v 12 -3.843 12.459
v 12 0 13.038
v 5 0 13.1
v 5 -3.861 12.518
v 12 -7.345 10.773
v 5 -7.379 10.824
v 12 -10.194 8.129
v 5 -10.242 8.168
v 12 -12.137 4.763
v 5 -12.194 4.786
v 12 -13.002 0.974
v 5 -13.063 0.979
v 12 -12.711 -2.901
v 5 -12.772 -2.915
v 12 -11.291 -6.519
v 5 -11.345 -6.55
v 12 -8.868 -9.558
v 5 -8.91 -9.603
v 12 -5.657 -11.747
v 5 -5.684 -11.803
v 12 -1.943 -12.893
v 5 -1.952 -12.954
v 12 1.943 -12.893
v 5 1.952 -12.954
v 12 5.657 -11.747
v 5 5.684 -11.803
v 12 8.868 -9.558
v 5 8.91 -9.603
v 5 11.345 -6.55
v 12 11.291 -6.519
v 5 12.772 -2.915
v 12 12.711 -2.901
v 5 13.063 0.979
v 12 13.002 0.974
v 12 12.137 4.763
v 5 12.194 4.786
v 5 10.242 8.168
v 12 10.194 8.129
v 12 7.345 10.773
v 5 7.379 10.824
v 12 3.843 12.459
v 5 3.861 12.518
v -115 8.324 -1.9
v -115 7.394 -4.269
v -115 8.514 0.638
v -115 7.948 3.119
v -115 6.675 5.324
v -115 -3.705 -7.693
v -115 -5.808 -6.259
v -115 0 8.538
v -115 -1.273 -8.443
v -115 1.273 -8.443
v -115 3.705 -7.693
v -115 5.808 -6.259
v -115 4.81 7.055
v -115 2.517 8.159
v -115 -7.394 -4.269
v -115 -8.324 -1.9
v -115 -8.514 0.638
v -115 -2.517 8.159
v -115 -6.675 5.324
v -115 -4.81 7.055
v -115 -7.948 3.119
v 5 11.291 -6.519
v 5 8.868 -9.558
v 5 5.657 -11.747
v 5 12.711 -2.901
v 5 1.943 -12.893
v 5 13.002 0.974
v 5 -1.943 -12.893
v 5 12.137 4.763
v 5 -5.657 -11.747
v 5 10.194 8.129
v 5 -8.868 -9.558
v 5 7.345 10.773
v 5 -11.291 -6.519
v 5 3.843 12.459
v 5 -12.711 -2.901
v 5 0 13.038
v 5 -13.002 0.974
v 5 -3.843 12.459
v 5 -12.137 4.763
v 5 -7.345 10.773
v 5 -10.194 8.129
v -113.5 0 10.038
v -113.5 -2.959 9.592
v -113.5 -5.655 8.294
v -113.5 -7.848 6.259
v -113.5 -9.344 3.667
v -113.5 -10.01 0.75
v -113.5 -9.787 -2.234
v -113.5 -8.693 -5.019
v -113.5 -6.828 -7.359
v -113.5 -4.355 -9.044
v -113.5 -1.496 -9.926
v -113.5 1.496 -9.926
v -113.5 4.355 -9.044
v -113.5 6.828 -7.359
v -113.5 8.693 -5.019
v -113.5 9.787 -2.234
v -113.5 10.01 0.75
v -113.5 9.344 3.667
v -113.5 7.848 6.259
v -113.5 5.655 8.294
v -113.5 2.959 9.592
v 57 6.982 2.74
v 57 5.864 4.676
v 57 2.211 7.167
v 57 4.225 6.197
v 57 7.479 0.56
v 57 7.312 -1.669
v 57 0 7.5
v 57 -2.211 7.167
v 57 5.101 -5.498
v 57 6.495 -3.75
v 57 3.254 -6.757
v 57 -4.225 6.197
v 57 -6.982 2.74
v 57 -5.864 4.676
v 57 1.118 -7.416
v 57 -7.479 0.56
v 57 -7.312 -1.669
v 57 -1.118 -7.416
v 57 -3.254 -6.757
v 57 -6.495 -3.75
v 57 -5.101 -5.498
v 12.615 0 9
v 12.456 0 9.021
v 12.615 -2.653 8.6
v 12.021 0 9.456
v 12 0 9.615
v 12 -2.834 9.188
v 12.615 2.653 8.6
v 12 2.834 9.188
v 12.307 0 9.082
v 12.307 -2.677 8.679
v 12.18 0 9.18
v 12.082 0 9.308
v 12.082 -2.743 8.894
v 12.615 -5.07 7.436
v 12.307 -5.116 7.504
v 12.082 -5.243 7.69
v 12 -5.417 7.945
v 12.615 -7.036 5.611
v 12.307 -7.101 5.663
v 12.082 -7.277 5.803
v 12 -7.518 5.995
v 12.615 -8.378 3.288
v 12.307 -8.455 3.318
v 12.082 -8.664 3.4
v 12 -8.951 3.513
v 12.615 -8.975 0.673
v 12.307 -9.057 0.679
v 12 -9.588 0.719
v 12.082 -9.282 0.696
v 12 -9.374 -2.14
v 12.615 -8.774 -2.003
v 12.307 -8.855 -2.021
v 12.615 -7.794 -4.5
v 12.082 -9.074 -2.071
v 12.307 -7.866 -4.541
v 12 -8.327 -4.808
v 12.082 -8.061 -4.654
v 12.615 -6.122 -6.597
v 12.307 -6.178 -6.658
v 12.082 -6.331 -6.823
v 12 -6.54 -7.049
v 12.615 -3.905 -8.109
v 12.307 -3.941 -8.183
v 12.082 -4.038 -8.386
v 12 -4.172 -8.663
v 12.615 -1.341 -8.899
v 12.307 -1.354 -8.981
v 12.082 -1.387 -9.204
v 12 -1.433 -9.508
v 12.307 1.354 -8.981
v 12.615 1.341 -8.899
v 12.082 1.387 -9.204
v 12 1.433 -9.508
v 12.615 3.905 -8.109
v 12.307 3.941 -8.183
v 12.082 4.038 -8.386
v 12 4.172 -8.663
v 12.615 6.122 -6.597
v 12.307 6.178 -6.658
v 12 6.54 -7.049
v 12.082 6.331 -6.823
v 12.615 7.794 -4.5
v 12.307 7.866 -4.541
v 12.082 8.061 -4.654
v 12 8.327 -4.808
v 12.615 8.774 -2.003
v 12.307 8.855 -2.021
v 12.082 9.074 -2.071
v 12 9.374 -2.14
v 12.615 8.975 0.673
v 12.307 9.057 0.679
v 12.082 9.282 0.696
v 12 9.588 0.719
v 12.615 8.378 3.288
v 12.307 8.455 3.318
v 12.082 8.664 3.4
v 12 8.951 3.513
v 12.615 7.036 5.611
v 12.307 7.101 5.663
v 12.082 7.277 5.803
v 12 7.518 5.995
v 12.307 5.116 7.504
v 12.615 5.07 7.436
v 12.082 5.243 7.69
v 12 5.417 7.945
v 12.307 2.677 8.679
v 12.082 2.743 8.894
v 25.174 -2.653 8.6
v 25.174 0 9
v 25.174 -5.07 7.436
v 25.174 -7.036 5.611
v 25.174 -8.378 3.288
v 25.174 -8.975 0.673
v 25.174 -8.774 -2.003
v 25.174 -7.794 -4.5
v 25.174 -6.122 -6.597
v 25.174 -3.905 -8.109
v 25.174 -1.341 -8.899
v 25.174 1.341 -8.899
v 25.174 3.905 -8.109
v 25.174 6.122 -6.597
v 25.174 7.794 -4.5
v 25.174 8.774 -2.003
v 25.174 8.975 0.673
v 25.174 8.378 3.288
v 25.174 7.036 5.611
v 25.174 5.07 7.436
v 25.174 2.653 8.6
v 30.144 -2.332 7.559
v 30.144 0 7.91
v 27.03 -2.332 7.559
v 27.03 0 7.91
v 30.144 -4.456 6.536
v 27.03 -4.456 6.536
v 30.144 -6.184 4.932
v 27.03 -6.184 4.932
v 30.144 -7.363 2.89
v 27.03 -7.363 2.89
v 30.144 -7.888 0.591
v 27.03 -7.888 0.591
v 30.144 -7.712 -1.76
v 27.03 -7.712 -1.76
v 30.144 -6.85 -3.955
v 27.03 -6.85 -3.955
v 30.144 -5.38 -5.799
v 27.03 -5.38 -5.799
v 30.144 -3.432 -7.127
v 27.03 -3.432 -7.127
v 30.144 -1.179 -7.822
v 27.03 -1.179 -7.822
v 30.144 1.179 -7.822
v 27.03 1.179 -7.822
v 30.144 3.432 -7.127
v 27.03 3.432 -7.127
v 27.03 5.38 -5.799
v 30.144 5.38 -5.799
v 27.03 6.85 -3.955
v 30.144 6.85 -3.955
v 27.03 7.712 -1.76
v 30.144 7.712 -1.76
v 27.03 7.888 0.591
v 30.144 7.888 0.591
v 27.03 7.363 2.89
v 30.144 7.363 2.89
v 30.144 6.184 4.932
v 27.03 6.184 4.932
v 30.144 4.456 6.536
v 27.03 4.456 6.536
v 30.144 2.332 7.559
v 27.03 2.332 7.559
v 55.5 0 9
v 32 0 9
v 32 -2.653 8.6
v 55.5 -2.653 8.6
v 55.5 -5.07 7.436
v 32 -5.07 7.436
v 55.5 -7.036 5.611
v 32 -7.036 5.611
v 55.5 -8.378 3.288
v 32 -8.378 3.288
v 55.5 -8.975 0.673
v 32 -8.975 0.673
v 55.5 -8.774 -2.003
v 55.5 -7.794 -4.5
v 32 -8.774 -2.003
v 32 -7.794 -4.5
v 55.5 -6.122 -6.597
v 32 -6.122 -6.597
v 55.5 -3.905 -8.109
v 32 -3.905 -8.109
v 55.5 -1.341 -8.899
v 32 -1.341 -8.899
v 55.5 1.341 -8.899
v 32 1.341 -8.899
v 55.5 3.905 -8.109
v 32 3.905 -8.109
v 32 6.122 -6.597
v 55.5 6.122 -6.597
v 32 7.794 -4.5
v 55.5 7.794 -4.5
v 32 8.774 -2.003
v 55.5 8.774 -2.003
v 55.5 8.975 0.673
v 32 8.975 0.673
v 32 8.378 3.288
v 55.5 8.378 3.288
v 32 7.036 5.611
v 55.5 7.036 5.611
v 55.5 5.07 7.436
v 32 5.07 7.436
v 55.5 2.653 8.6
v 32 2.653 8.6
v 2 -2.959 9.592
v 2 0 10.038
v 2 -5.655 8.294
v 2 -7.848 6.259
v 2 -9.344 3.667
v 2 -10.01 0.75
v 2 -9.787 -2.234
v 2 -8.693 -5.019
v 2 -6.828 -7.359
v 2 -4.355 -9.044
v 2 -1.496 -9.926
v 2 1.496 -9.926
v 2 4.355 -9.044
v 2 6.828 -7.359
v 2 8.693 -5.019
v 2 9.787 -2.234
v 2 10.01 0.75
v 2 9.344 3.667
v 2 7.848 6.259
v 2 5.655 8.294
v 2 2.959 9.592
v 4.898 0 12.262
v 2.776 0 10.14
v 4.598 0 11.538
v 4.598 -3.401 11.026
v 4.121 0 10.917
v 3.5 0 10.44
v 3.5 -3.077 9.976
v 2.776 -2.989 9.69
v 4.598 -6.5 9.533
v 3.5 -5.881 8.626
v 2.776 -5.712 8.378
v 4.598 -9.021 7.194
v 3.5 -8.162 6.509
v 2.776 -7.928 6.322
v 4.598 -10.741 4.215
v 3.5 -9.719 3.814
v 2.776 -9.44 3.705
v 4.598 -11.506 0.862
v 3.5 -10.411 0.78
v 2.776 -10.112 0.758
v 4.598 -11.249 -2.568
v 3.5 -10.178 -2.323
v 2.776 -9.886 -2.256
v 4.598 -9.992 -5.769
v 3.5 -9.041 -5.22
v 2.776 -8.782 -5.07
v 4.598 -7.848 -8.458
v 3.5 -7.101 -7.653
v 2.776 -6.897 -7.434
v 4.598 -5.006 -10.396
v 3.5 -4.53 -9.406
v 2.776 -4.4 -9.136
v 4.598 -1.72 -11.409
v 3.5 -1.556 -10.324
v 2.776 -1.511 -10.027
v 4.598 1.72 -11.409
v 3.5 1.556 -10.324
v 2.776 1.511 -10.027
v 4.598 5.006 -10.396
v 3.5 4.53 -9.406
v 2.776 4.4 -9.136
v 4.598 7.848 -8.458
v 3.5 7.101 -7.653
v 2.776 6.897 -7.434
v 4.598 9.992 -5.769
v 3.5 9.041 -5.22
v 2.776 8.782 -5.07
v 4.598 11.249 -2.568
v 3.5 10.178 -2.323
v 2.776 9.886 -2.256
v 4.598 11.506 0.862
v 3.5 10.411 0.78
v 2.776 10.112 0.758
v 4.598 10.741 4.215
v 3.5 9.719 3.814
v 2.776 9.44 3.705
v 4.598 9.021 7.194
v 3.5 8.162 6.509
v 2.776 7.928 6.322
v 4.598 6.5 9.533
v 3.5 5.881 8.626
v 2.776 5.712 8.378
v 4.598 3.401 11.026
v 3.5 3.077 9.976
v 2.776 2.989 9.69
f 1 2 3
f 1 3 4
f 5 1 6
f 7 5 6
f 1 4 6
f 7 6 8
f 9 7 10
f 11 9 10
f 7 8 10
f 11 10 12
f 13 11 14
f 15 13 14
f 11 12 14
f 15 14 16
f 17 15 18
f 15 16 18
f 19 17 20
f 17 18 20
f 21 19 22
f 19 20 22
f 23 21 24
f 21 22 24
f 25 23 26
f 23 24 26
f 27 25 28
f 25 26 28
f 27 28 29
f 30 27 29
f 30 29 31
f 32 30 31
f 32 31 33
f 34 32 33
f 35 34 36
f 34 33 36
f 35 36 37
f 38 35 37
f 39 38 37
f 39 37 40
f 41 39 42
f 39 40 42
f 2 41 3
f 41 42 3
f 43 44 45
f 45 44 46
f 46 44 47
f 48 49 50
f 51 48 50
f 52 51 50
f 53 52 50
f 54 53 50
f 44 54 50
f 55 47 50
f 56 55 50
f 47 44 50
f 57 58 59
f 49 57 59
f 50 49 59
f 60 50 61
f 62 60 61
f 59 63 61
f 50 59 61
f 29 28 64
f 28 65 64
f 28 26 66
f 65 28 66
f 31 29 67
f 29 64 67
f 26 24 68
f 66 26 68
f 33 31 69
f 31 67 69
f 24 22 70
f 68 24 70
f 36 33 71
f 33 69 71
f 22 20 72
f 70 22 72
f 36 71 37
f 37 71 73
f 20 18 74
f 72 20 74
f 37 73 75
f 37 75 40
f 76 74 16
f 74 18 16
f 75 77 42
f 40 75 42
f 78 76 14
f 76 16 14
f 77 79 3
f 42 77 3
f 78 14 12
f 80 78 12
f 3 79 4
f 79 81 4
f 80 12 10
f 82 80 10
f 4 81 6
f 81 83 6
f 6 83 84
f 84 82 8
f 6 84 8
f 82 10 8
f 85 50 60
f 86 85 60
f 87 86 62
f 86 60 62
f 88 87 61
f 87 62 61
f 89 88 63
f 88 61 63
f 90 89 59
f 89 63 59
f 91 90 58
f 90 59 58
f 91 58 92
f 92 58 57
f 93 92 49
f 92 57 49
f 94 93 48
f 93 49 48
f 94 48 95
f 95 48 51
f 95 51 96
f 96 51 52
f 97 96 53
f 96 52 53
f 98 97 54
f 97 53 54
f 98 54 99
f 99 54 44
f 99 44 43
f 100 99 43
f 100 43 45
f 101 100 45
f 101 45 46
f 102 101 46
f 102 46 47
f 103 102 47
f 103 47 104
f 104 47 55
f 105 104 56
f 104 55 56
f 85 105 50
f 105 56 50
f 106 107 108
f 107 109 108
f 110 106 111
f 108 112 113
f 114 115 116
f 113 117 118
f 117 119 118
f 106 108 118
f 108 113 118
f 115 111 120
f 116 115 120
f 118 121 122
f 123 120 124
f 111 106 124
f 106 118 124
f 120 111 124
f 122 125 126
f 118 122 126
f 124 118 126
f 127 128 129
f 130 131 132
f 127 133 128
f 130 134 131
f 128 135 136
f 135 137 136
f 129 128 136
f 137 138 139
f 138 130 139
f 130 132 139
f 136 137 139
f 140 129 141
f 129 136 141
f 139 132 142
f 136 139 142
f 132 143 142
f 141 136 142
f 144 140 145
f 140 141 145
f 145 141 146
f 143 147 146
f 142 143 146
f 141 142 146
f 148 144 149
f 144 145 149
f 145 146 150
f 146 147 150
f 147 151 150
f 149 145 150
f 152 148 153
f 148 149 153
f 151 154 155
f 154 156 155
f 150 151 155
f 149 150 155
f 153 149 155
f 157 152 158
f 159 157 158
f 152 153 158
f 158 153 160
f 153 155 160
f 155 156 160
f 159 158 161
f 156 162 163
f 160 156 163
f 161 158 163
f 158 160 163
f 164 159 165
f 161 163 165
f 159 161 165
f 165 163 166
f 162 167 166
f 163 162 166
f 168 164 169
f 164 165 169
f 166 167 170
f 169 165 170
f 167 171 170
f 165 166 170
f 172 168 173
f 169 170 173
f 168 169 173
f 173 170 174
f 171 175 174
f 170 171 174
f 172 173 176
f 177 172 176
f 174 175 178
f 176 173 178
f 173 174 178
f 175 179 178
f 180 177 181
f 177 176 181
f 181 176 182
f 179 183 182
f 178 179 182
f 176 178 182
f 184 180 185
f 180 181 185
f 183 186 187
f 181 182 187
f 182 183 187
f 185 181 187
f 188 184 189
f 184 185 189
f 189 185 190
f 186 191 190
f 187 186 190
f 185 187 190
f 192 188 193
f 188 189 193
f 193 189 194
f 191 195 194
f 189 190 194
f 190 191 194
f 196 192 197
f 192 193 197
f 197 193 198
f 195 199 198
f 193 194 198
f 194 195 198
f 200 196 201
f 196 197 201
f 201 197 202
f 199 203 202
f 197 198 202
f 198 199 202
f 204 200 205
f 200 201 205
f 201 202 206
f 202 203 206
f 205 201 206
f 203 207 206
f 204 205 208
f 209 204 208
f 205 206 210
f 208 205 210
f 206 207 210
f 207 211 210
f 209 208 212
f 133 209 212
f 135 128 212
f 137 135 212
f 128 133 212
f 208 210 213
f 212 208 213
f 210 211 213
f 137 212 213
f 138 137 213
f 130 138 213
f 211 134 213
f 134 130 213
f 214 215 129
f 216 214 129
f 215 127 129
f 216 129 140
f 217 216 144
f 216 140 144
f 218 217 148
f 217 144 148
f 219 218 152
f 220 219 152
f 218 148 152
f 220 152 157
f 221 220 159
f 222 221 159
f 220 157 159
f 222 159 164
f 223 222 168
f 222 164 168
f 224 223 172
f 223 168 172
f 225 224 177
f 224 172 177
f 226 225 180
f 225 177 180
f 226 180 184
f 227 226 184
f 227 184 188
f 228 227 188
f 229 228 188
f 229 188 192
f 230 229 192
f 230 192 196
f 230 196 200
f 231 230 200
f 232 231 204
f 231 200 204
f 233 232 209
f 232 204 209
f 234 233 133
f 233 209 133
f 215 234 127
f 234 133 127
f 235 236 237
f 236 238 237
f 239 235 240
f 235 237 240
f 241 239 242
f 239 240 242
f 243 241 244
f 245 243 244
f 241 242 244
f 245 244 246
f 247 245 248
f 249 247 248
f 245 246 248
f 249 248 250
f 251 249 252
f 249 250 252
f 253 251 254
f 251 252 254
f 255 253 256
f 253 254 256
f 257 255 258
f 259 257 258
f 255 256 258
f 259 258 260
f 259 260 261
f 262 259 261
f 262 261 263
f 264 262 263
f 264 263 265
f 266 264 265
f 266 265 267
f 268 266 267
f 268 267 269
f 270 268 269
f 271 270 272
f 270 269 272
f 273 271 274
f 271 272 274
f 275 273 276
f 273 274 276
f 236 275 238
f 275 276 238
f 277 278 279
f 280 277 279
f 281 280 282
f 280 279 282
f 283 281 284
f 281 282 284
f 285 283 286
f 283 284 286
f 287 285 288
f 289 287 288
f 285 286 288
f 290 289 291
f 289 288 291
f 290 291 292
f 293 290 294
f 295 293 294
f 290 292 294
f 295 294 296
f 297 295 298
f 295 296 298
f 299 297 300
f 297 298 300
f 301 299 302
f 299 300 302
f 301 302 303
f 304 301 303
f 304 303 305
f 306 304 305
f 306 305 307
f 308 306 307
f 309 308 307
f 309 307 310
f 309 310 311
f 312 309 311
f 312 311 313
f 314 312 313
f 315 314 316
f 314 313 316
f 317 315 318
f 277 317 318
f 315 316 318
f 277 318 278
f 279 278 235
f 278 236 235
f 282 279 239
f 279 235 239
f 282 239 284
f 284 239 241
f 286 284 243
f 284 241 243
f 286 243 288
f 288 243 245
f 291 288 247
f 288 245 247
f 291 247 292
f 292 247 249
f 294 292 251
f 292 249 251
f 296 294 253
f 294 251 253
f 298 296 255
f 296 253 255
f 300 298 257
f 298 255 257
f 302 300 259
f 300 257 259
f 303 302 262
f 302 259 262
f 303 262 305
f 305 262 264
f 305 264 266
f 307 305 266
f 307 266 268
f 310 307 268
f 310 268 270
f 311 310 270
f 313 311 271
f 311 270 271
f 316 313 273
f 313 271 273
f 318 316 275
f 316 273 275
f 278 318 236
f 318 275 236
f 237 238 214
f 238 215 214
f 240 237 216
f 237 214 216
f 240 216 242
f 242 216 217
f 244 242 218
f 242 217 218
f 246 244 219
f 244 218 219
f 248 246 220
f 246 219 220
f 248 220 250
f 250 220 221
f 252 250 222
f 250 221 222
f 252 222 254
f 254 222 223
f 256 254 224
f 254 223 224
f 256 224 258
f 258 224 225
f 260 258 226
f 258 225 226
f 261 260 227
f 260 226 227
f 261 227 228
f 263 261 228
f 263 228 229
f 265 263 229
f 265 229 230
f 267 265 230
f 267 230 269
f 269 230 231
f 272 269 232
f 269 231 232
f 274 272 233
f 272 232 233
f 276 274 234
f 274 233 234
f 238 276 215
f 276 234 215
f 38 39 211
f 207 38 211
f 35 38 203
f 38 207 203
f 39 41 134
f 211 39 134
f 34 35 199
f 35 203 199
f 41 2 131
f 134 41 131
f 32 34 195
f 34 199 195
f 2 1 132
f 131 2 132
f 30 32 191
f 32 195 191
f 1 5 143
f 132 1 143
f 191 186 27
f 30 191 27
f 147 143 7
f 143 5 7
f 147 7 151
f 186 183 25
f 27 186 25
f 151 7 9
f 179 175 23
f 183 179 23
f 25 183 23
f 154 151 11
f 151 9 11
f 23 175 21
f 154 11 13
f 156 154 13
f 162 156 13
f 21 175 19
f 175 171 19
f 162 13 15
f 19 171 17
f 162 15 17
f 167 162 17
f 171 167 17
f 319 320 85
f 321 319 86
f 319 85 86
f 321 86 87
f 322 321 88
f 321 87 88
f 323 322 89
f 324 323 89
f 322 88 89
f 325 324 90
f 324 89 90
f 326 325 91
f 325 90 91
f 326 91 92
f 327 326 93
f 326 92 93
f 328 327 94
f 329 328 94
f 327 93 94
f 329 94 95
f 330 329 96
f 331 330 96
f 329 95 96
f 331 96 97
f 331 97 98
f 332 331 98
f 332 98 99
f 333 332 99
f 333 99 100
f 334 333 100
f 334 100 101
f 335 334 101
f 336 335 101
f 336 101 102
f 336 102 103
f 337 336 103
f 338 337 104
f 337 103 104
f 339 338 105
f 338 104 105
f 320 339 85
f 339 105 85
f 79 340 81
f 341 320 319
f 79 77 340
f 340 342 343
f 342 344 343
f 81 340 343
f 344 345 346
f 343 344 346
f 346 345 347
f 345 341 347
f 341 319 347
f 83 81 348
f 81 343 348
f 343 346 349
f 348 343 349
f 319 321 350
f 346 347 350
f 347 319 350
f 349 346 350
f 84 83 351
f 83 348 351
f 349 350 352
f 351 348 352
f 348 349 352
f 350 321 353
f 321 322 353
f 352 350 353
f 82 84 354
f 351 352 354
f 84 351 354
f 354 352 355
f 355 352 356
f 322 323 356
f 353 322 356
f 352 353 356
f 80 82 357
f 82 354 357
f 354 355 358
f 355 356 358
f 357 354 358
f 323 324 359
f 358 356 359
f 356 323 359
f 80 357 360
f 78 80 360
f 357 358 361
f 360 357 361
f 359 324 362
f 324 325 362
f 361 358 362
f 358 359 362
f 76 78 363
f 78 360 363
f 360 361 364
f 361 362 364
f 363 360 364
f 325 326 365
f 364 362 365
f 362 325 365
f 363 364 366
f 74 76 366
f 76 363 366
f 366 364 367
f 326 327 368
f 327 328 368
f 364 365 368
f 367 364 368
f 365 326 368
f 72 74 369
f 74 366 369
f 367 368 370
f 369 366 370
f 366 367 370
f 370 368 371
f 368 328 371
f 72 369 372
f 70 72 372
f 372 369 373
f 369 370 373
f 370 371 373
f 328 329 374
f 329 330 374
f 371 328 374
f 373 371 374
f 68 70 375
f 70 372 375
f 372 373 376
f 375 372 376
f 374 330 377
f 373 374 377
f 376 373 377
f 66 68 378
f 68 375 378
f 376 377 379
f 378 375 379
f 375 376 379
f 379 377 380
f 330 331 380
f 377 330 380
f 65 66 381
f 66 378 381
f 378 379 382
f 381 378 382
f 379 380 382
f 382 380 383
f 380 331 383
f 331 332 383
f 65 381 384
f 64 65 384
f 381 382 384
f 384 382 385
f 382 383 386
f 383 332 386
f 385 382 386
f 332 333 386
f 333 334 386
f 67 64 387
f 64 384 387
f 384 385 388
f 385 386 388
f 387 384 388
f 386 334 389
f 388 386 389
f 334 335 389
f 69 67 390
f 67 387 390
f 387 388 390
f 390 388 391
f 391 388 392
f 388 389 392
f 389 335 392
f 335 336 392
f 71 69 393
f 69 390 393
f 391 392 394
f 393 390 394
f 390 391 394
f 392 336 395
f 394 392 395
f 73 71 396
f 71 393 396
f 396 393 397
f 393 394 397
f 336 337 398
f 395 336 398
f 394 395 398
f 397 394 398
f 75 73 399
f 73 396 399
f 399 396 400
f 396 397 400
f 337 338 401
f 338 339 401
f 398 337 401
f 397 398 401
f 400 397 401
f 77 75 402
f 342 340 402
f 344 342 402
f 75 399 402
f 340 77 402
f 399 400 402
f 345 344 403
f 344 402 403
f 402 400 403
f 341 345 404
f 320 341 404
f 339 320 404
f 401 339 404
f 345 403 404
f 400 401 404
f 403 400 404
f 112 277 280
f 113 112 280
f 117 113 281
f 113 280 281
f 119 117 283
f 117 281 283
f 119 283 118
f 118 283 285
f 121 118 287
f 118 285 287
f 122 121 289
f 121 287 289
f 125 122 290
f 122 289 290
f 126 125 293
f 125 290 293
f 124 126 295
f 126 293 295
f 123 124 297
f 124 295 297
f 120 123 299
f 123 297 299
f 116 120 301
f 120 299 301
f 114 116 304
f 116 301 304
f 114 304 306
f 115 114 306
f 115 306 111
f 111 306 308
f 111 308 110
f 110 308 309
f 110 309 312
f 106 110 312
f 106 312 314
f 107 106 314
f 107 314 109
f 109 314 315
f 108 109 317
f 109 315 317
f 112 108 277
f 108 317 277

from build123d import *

# Parameters (mm, degrees)
F2_SIZE = 1.5
F3_SIZE = 1.5


with BuildPart() as f1:
    # F0 (on Front) → F1 (revolve)
    with BuildSketch(Plane.XZ):
        with BuildLine():
            Line((5, 13.1), (5, 13.038275))
            ThreePointArc((5, 13.038275), (4.12132, 10.916955), (2, 10.038275))
            Line((2, 10.038275), (-115, 10.038275))
            Line((-115, 10.038275), (-115, 0))
            Line((-115, 0), (56.999728, 0))
            Line((56.999728, 0), (56.999728, 9))
            Line((56.999728, 9), (31.999728, 9))
            Line((31.999728, 9), (30.143602, 7.910138))
            Line((30.143602, 7.910138), (27.029878, 7.910138))
            Line((27.029878, 7.910138), (25.173751, 9))
            Line((25.173751, 9), (12.615061, 9))
            ThreePointArc((12.615061, 9), (12.179955, 9.180227), (11.999728, 9.615333))
            Line((11.999728, 9.615333), (11.999728, 13.038275))
            Line((11.999728, 13.038275), (5, 13.1))
        make_face()
    revolve(axis=Axis((-29.000136, 0, 0), (1, 0, 0)))

    # F2
    f2_edges = [f1.edges().sort_by_distance(p)[0] for p in [
        (56.999728, 0, -9),
    ]]
    chamfer(f2_edges, length=F2_SIZE)

    # F3
    f3_edges = [f1.edges().sort_by_distance(p)[0] for p in [
        (-115, 0, -10.038275),
    ]]
    chamfer(f3_edges, length=F3_SIZE)


solid = f1.part
